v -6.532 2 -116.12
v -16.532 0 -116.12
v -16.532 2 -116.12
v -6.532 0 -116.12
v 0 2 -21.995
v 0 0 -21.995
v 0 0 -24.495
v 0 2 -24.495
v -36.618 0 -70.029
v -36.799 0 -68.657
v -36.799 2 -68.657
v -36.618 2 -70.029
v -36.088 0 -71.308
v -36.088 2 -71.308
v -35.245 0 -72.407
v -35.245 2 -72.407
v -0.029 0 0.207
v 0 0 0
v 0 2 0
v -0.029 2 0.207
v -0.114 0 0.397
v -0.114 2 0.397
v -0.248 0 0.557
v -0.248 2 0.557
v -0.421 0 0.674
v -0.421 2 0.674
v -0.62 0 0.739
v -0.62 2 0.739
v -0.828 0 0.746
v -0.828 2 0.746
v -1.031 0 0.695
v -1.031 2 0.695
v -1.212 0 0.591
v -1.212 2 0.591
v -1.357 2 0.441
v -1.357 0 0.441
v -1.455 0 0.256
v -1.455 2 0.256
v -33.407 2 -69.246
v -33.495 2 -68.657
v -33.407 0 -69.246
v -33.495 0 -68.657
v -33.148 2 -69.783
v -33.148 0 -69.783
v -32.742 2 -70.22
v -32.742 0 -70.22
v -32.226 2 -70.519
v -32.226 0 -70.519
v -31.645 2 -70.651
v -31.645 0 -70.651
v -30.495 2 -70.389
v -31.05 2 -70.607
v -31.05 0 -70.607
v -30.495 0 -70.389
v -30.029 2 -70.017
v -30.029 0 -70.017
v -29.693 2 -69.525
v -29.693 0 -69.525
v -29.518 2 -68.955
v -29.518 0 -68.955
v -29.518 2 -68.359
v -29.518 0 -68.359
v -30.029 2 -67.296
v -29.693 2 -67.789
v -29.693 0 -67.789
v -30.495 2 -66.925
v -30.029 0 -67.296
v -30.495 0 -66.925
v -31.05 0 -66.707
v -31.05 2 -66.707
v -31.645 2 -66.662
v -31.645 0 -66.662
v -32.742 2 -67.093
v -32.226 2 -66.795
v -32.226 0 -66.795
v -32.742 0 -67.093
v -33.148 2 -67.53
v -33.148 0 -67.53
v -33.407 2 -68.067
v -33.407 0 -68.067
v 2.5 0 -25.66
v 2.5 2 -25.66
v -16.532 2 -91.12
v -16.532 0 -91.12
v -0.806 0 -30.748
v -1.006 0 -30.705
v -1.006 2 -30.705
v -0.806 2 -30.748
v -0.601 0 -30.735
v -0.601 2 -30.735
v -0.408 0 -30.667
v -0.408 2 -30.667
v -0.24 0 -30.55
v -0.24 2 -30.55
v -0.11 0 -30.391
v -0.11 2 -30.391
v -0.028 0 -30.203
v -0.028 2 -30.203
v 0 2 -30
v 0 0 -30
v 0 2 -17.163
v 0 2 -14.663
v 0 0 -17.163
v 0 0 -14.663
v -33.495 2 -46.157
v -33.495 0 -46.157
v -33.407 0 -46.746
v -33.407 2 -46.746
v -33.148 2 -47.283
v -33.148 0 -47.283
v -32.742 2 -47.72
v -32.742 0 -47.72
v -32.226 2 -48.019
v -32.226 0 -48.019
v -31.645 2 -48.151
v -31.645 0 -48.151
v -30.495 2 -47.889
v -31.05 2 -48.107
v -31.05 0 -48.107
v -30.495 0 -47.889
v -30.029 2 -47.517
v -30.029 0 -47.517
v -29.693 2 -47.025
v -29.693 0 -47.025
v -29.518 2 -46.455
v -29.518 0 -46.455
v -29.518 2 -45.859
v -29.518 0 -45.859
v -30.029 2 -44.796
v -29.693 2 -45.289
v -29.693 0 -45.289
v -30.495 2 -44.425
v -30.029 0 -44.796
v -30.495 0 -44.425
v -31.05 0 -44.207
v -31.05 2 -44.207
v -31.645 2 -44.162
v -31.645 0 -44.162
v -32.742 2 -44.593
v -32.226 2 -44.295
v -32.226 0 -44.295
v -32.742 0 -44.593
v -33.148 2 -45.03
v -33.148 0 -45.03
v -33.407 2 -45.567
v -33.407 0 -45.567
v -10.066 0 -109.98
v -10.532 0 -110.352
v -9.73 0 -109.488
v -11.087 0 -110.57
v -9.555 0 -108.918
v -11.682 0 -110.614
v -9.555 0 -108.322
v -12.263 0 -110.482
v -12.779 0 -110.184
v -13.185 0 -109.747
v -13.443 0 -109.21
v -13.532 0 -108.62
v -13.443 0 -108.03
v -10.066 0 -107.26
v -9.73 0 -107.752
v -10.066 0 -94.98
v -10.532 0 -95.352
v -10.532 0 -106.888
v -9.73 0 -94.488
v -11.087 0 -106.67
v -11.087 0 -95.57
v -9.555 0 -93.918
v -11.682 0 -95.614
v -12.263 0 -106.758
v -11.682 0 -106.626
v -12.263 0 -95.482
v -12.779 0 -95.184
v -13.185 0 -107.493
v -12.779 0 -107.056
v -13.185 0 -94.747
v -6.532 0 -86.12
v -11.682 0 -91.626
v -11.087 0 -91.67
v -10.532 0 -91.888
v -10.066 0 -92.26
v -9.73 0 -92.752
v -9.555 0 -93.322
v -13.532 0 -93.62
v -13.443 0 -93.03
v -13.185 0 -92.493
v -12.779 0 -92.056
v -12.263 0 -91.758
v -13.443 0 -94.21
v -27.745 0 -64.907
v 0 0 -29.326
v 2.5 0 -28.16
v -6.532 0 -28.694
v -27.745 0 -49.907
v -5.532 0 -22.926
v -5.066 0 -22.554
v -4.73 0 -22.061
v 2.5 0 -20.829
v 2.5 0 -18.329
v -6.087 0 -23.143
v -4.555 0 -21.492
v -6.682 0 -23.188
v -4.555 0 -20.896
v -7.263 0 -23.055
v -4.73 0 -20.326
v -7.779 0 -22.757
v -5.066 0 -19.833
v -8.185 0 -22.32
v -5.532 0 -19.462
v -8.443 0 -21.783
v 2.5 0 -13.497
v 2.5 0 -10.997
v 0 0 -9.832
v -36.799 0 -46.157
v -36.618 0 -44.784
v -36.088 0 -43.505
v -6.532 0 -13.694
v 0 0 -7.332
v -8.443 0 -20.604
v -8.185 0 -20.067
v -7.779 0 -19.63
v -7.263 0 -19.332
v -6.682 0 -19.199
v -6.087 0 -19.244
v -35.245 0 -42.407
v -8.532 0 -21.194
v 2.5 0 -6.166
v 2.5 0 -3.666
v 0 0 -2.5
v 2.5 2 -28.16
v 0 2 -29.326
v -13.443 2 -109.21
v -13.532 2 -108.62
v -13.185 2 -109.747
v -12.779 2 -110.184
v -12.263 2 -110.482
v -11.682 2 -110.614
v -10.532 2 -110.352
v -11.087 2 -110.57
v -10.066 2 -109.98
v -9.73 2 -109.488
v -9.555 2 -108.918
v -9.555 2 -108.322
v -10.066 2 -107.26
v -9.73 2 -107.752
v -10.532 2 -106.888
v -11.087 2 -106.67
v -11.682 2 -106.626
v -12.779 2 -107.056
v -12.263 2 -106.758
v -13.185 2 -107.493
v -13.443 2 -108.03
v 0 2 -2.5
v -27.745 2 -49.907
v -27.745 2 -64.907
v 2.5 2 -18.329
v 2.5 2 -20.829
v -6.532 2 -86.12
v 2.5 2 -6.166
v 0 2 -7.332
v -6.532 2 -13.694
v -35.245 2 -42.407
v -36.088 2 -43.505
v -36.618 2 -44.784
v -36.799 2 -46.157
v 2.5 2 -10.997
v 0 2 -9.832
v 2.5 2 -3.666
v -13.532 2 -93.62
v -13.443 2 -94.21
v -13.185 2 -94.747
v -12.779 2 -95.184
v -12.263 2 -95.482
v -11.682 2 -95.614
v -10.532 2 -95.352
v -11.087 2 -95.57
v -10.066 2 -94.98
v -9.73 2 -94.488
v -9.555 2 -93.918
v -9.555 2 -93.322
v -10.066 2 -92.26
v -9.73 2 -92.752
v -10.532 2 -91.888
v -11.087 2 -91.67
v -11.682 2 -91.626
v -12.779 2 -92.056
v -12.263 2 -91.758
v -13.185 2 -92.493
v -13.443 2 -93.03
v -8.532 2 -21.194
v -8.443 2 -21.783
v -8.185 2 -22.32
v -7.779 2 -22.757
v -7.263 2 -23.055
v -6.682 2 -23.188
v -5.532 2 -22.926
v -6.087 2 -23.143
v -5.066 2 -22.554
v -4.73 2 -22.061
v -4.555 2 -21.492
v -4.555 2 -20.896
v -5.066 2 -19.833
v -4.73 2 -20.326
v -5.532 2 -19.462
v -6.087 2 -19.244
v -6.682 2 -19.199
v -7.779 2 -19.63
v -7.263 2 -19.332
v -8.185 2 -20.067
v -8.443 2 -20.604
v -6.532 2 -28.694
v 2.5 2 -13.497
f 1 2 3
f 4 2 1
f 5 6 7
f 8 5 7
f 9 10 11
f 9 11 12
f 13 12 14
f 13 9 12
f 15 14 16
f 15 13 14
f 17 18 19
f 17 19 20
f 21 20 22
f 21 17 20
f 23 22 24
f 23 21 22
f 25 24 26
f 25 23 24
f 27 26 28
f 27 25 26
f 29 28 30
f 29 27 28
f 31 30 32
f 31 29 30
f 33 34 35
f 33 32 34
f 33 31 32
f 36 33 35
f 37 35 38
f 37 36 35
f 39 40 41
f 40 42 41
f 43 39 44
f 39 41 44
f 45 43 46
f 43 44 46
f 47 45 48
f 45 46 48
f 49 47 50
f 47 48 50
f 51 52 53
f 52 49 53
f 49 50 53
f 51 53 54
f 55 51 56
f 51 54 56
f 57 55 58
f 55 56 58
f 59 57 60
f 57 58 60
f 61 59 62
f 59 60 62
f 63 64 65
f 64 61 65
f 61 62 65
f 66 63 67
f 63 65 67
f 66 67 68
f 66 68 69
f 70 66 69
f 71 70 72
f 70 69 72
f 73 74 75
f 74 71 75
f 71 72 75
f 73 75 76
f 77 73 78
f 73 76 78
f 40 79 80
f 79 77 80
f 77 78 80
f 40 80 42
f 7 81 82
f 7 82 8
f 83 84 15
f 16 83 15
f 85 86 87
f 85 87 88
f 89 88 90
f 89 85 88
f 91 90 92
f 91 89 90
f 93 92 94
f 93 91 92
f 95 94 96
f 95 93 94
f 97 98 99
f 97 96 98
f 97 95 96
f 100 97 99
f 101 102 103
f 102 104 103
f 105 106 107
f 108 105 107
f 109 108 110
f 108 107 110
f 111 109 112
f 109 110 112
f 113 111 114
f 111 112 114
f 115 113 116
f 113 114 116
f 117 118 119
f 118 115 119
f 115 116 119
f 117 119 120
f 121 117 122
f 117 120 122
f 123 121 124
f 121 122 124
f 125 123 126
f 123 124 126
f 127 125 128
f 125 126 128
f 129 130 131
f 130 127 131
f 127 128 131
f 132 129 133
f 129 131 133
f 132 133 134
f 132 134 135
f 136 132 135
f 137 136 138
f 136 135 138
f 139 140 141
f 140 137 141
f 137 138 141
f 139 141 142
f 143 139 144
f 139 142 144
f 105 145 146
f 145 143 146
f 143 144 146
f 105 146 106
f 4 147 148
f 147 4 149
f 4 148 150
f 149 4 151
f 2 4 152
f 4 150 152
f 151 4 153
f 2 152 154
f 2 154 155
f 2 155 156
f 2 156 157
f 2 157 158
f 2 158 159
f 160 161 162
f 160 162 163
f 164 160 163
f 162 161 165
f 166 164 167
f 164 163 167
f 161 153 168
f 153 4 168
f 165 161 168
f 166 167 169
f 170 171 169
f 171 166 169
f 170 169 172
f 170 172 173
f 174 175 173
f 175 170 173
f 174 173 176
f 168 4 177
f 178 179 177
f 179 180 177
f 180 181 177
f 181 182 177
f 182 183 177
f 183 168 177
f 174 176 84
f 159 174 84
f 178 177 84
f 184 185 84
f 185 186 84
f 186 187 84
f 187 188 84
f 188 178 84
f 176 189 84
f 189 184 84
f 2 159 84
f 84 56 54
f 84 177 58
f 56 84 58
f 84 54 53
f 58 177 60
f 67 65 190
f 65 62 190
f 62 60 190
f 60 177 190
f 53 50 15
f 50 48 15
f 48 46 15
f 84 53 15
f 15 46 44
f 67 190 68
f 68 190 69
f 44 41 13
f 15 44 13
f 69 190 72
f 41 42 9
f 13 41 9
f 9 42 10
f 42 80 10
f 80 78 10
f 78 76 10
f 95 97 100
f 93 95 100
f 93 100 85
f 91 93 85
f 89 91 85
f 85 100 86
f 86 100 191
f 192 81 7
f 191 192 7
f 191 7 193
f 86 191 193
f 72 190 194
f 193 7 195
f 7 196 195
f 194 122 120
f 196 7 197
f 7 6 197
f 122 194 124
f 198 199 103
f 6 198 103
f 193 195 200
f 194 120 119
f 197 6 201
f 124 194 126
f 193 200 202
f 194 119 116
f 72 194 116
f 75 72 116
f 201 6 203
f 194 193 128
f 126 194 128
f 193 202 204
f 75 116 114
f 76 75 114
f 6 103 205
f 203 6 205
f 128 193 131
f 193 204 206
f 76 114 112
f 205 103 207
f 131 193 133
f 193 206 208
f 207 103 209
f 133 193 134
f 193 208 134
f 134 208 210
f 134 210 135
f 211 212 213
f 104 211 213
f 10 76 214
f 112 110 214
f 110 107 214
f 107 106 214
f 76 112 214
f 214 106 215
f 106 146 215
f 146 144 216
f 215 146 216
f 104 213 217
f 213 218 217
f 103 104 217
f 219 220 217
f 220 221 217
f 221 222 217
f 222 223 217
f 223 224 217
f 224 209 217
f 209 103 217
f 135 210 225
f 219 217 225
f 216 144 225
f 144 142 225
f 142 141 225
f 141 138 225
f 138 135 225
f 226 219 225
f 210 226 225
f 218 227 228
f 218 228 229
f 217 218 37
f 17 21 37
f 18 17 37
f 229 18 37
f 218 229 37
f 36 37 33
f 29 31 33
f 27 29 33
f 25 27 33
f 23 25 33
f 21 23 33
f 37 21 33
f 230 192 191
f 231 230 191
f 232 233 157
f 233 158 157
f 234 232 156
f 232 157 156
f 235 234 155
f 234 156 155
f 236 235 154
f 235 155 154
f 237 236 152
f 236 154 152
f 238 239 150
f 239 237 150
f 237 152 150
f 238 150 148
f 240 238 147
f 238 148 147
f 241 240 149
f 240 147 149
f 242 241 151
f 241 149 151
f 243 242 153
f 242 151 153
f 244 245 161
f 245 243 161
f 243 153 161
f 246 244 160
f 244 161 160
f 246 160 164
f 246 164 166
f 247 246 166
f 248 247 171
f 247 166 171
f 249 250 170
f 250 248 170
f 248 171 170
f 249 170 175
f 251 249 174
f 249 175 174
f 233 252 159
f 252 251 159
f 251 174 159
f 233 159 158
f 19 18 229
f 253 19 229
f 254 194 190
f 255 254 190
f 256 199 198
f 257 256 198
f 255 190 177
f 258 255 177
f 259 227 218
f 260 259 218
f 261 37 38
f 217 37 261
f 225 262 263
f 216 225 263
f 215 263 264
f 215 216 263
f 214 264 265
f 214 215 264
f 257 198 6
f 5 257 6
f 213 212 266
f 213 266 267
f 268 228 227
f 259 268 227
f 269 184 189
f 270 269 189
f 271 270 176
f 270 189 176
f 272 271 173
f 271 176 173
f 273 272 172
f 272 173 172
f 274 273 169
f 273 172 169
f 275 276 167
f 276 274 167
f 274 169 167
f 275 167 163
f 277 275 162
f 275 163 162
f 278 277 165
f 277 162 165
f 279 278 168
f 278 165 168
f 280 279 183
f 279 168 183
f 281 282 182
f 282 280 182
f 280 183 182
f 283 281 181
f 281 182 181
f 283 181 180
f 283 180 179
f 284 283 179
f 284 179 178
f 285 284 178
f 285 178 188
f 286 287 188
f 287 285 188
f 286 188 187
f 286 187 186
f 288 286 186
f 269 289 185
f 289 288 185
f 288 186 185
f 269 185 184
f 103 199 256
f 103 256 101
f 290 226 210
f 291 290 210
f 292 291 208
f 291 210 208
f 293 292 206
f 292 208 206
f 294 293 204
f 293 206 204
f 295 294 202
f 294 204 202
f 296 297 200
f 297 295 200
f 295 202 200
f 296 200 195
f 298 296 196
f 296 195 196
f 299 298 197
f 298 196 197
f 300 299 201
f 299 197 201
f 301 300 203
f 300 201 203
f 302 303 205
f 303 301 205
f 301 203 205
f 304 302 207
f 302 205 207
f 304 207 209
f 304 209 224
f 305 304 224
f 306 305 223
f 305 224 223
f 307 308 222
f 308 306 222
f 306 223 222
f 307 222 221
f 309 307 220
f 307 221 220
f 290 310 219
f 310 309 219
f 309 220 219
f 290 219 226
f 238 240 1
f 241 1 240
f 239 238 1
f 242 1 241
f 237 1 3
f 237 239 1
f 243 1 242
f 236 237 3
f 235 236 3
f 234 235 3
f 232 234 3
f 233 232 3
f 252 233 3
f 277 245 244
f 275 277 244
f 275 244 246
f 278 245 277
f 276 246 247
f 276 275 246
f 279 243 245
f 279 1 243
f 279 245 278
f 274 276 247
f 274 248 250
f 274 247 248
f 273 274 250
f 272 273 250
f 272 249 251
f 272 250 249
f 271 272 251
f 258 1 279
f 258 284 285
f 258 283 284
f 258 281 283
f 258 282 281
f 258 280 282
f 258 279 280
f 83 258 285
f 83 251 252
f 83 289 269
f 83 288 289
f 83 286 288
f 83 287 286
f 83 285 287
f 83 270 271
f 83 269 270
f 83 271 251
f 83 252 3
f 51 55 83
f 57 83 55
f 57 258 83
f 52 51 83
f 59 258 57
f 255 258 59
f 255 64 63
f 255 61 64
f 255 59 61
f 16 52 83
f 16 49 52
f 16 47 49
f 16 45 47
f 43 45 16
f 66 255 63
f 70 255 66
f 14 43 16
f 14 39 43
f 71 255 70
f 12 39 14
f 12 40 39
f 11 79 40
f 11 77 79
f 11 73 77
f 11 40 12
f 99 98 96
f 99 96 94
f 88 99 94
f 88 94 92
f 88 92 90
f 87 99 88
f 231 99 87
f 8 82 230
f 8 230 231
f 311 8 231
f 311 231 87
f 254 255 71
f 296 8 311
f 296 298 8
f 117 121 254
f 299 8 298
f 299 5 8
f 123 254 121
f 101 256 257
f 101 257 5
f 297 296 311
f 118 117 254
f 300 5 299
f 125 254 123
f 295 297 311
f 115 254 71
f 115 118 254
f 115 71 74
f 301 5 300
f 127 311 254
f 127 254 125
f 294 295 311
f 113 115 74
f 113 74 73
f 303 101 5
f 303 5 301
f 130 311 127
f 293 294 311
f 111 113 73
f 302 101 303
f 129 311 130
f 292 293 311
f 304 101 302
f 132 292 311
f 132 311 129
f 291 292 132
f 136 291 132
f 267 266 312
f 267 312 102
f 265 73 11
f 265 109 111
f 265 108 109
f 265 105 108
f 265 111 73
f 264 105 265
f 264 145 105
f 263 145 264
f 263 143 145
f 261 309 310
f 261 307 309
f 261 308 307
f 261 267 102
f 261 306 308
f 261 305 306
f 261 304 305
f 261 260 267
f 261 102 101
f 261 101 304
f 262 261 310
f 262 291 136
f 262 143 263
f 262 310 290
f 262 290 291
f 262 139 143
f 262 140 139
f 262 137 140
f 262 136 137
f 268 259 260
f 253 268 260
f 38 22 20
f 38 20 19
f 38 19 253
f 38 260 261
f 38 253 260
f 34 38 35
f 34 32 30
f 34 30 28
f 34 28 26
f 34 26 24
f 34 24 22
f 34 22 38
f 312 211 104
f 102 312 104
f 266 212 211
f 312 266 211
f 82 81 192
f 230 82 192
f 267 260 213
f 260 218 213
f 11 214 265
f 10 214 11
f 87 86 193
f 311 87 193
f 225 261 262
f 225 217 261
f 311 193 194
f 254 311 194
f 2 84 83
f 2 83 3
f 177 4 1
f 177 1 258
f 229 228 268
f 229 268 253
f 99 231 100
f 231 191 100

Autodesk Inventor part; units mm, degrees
ref_plane "YZ Plane" through (0, 0, 0) normal (1, 0, 0) x (0, 1, 0)
ref_plane "XZ Plane" through (0, 0, 0) normal (0, 1, 0) x (-1, 0, 0)
ref_plane "XY Plane" through (0, 0, 0) normal (0, 0, 1) x (1, 0, 0)
sketch "Sketch1" plane through (0, 0, 0) normal (0, 1, 0) x (-1, 0, 0)
  line L0 (0, 0) -> (0, -30)
  line L1 (0, 0) -> (0.75, 0) construction
  arc A0 (1.4548, 0.2565) -> (0, 0) centre (0.75, 0) ccw
  line L2 (1.4548, 0.2565) -> (6.5322, -13.6936)
  line L3 (0, -30) -> (0.75, -30) construction
  circle A1 centre (0.75, -30) radius 0.75
  line L4 (1.0065, -30.7048) -> (6.5322, -28.6936)
  line L5 (6.5322, -13.6936) -> (6.5322, -28.6936) construction
  line L6 (6.5322, -13.6936) -> (35.2454, -42.4068)
  line L7 (6.5322, -13.6936) -> (66.5322, -13.6936) construction
  line L8 (6.5322, -28.6936) -> (27.7454, -49.9068)
  line L9 (6.5322, -28.6936) -> (36.5322, -28.6936) construction
  line L10 (27.7454, -49.9068) -> (27.7454, -64.9068)
  line L11 (27.7454, -64.9068) -> (6.5322, -86.12)
  line L12 (27.7454, -64.9068) -> (57.7454, -64.9068) construction
  line L13 (35.2454, -42.4068) -> (27.7454, -49.9068) construction
  arc A2 (36.7987, -46.1568) -> (35.2454, -42.4068) centre (31.4954, -46.1568) ccw
  line L14 (36.7987, -46.1568) -> (36.7987, -68.6568)
  line L15 (27.7454, -64.9068) -> (27.7454, -79.9068) construction
  line L16 (27.7454, -79.9068) -> (16.5322, -91.12)
  line L17 (27.7454, -79.9068) -> (35.2454, -72.4068)
  line L18 (27.7454, -64.9068) -> (35.2454, -72.4068) construction
  arc A3 (35.2454, -72.4068) -> (36.7987, -68.6568) centre (31.4954, -68.6568) ccw
  line L19 (6.5322, -86.12) -> (16.5322, -86.12) construction
  line L20 (16.5322, -86.12) -> (16.5322, -91.12) construction
  line L21 (16.5322, -116.12) -> (6.5322, -116.12)
  line L22 (6.5322, -116.12) -> (6.5322, -86.12)
  line L23 (16.5322, -91.12) -> (16.5322, -116.12)
  circle A4 centre (11.5322, -93.62) radius 2
  circle A5 centre (11.5322, -108.62) radius 2
  line L24 (0, -3.6658) -> (-2.5, -3.6658)
  line L25 (-2.5, -3.6658) -> (-2.5, -6.1658)
  line L26 (-2.5, -6.1658) -> (0, -6.1658)
  line L27 (0, -6.1658) -> (0, -3.6658)
  line L28 (-2.5, -3.6658) -> (0, -2.5)
  line L29 (-2.5, -6.1658) -> (0, -7.3315)
  line L30 (0, -10.9973) -> (-2.5, -10.9973)
  line L31 (-2.5, -10.9973) -> (-2.5, -13.4973)
  line L32 (-2.5, -13.4973) -> (0, -13.4973)
  line L33 (-2.5, -10.9973) -> (0, -9.8315)
  line L34 (-2.5, -13.4973) -> (0, -14.6631)
  line L35 (-2.5, -18.3288) -> (-2.5, -20.8288)
  line L36 (-2.5, -20.8288) -> (0, -21.9946)
  line L37 (-2.5, -20.8288) -> (0, -20.8288)
  line L38 (0, -18.3288) -> (-2.5, -18.3288)
  line L39 (-2.5, -18.3288) -> (0, -17.1631)
  line L40 (-2.5, -25.6604) -> (0, -24.4946)
  line L41 (0, -25.6604) -> (-2.5, -25.6604)
  line L42 (-2.5, -25.6604) -> (-2.5, -28.1604)
  line L43 (-2.5, -28.1604) -> (0, -28.1604)
  line L44 (-2.5, -28.1604) -> (0, -29.3262)
  circle A6 centre (6.5322, -21.1936) radius 2
  circle A7 centre (31.4954, -46.1568) radius 2
  circle A8 centre (31.4954, -68.6568) radius 2
  dimension "d2" = 30
  dimension "d17" = 0.75
  dimension "d18" = 20
  dimension "d19" = 0.75
  dimension "d20" = 70
  dimension "d21" = 15
  dimension "d28" = 45
  dimension "d29" = 30
  dimension "d30" = 45
  dimension "d31" = 15
  dimension "d34" = 135
  dimension "d35" = 15
  dimension "d36" = 135
  dimension "d38" = 10
  dimension "d39" = 30
  dimension "d40" = 30
  dimension "d41" = 7.5
  dimension "d42" = 5
  dimension "d43" = 7.5
  dimension "d44" = 5
  dimension "d45" = 4
  dimension "d46" = 4
  dimension "d47" = 2.5
  dimension "d48" = 2.5
  dimension "d49" = 25
  dimension "d50" = 25
  dimension "d51" = 2.5
  dimension "d52" = 2.5
  dimension "d53" = 2.5
  dimension "d54" = 25
  dimension "d55" = 25
  dimension "d56" = 2.5
  dimension "d57" = 2.5
  dimension "d58" = 2.5
  dimension "d59" = 25
  dimension "d60" = 25
  dimension "d61" = 2.5
  dimension "d62" = 2.5
  dimension "d63" = 2.5
  dimension "d64" = 25
  dimension "d65" = 25
  dimension "d66" = 2.5
  dimension "d69" = 4
  dimension "d70" = 4
  dimension "d71" = 4
extrude "Extrusion2" add sketch "Sketch1" along normal blind 2
properties part number "claw_gripper"
